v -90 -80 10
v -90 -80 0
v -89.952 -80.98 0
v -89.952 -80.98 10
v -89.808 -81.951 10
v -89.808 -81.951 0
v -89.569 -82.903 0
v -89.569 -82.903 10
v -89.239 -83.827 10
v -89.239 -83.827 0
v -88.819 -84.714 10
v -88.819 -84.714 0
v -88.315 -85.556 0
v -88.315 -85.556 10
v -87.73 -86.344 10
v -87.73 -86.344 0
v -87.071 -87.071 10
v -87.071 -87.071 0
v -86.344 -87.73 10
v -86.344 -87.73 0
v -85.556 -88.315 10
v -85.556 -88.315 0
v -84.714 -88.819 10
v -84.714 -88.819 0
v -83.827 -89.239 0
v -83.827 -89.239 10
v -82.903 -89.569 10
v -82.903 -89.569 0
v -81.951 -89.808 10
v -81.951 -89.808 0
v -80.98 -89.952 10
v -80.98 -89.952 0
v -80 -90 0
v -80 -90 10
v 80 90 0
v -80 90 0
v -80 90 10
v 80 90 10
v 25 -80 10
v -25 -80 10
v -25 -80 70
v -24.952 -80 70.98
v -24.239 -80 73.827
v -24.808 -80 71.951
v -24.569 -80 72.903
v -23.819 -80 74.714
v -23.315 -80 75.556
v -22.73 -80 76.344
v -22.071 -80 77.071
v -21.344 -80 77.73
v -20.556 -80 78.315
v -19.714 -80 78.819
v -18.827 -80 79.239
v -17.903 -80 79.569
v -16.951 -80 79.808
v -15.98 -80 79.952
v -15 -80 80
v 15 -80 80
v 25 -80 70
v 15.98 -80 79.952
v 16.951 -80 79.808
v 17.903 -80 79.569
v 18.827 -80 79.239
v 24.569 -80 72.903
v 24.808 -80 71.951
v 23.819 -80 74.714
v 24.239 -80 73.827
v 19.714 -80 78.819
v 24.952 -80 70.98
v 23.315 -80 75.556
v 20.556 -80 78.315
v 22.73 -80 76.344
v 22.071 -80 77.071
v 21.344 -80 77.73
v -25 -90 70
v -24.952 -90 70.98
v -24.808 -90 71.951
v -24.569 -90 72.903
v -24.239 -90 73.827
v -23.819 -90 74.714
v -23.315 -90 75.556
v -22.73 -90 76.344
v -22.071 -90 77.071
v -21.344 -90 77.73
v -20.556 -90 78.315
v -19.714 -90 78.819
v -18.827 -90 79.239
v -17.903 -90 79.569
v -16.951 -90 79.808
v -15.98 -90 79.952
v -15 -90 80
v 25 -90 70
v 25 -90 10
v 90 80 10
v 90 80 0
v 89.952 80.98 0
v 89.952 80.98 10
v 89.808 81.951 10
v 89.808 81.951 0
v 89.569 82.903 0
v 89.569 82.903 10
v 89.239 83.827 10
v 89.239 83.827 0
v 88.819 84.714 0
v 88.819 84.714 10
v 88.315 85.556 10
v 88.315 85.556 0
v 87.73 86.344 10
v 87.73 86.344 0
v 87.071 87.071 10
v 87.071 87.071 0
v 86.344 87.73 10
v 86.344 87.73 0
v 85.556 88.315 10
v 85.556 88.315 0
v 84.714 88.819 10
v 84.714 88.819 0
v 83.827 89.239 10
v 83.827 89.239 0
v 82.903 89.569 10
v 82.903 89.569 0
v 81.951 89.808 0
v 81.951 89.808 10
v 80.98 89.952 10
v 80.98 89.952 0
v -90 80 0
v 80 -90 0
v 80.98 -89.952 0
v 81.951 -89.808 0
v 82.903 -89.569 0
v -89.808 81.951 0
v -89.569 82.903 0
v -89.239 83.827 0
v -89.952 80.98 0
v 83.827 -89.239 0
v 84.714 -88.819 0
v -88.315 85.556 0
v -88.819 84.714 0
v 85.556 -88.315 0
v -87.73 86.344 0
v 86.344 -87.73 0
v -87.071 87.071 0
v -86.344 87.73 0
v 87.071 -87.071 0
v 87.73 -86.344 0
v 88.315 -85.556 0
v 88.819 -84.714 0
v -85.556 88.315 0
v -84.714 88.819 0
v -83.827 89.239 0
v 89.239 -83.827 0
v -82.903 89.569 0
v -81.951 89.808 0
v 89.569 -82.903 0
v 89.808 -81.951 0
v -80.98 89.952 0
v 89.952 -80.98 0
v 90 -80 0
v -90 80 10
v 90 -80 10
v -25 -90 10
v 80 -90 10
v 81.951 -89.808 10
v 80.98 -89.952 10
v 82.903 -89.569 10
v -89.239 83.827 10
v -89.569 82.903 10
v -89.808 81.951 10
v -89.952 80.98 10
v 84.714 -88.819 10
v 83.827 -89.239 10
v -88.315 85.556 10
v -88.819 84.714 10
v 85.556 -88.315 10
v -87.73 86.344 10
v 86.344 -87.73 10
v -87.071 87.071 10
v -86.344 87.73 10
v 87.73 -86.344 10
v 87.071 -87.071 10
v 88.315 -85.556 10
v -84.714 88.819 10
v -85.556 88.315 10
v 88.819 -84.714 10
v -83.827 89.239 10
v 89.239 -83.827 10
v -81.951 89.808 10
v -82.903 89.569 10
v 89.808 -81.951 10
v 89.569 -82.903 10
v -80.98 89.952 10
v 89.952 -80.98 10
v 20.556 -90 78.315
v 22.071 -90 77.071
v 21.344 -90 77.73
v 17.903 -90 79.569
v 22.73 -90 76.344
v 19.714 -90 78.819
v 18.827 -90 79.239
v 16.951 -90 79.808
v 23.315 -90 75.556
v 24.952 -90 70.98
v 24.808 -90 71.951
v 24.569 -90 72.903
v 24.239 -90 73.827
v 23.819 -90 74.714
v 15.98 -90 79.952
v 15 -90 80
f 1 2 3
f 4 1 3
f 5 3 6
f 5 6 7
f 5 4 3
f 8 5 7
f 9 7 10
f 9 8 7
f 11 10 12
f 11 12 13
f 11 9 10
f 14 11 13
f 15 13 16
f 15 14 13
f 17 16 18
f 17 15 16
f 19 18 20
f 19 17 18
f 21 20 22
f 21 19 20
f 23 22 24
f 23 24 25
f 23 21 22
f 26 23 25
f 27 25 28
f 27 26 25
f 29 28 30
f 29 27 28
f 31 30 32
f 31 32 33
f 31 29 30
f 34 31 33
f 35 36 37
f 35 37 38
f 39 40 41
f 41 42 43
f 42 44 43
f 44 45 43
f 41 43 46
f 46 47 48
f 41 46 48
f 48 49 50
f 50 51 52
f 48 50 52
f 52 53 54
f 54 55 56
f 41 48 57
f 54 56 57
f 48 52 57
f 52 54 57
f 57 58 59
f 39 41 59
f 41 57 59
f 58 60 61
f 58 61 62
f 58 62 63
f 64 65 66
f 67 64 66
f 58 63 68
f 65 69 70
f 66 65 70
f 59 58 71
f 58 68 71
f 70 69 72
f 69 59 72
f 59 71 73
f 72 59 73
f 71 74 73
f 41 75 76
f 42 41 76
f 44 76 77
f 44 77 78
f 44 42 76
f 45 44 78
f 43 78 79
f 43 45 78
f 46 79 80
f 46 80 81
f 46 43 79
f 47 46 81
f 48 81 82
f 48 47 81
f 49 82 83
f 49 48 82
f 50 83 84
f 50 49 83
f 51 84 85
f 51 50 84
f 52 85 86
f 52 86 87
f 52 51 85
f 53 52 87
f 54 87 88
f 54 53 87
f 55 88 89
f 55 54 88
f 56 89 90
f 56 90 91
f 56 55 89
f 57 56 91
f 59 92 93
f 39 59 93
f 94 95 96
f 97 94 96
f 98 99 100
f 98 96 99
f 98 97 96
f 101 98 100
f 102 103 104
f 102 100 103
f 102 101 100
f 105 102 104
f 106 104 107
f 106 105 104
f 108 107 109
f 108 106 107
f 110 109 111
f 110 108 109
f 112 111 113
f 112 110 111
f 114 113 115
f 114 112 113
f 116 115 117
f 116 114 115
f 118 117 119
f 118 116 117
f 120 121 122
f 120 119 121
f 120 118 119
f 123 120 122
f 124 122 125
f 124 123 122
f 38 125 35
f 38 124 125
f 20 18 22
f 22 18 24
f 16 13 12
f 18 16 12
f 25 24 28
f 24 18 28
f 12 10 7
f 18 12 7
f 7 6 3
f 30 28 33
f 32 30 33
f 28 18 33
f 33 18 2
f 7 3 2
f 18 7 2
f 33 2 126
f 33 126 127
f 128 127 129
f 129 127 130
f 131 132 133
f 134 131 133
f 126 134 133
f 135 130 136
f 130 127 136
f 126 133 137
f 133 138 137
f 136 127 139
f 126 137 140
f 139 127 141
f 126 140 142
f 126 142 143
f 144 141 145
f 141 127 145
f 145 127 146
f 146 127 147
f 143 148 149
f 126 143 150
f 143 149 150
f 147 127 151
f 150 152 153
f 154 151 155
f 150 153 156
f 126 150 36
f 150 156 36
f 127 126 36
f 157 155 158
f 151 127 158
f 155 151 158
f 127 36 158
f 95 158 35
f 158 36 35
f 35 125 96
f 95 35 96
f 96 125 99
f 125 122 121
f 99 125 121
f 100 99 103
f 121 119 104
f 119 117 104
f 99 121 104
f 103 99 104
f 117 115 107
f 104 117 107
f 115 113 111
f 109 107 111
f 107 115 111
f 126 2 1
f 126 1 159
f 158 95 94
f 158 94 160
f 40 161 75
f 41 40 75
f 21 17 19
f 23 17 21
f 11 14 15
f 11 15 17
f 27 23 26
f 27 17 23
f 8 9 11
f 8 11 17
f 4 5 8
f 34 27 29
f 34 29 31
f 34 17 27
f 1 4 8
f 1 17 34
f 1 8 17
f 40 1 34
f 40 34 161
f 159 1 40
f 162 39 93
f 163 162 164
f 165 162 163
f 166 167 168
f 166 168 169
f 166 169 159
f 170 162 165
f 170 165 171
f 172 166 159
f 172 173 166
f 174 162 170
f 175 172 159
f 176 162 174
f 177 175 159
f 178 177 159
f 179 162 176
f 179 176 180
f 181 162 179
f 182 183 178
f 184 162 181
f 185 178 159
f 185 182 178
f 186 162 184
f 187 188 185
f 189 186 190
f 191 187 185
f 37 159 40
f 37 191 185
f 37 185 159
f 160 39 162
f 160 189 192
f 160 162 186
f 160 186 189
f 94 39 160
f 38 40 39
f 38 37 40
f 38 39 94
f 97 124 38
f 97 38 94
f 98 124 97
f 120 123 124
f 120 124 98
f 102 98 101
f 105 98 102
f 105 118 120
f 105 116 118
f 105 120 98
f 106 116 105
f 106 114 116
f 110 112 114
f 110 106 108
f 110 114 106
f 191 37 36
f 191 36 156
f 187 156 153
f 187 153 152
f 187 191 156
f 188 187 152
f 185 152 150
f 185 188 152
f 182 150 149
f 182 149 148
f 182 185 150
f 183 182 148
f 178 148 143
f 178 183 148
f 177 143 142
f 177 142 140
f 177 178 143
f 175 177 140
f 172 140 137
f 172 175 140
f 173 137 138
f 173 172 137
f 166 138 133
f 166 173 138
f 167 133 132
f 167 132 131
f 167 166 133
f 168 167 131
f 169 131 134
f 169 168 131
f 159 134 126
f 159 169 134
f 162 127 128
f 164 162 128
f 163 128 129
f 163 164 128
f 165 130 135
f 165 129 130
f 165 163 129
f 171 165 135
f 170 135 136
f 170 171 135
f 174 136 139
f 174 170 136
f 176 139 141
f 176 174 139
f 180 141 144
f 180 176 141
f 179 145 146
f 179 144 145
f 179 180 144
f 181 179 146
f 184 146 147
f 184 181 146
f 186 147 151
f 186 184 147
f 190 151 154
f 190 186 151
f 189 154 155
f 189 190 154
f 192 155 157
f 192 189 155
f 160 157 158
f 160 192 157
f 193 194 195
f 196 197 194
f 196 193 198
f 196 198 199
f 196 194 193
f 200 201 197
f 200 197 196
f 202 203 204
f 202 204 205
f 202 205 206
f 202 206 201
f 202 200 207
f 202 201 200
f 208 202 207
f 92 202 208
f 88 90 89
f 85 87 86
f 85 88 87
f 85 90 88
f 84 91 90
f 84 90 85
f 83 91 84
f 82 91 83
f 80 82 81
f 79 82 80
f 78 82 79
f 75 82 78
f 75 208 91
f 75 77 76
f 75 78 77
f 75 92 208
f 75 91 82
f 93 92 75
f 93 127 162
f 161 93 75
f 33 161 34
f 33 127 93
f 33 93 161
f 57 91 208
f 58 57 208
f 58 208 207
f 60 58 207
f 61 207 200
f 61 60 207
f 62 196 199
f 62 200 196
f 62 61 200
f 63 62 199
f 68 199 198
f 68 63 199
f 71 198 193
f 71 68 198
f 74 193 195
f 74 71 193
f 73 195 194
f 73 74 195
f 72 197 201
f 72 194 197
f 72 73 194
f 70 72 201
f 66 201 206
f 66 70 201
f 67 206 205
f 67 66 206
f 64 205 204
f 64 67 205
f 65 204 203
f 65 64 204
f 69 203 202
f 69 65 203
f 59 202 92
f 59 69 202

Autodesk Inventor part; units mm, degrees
ref_plane "YZ Plane" through (0, 0, 0) normal (1, 0, 0) x (0, 1, 0)
ref_plane "XZ Plane" through (0, 0, 0) normal (0, 1, 0) x (-1, 0, 0)
ref_plane "XY Plane" through (0, 0, 0) normal (0, 0, 1) x (1, 0, 0)
sketch "Sketch1" plane through (0, 0, 0) normal (0, 0, 1) x (1, 0, 0)
  line L0 (-90, 90) -> (90, 90)
  line L1 (90, 90) -> (90, -90)
  line L2 (90, -90) -> (-90, -90)
  line L3 (-90, -90) -> (-90, 90)
  line L4 (90, 40) -> (165, 40)
  line L5 (165, 40) -> (165, -40)
  line L6 (165, -40) -> (90, -40)
  line L7 (90, -40) -> (90, 40)
  point P0 (0, 0)
  point P1 (-90, 0)
  point P2 (165, 0)
  point P3 (90, 0)
  point P4 (90, -40)
  dimension "d0" = 90
  dimension "d1" = 180
  dimension "d2" = 180
  dimension "d29" = 75
  dimension "d30" = 80
extrude "Extrusion1" add sketch "Sketch1" along normal blind 10 contours L0 L1 L2 L3
sketch "Sketch3" plane through (-90, -90, 0) normal (0, -1, 0) x (1, 0, 0)
  line L0 (0, 0) -> (180, 0) projected
  line L1 (180, 0) -> (180, 10) projected
  line L2 (0, 10) -> (180, 10) projected
  line L3 (0, 0) -> (0, 10) projected
  line L4 (65, 10) -> (65, 80)
  line L5 (65, 80) -> (115, 80)
  line L6 (115, 80) -> (115, 10)
  line L7 (0, 10) -> (180, 10) projected
  point P0 (90, 0)
  point P1 (90, 80)
  point P2 (90, 10)
  dimension "d22" = 70
  dimension "d23" = 50
extrude "Extrusion4" add sketch "Sketch3" against normal blind 10 contours L4 L5 L6 L2
fillet "Fillet4" radius 10 6 edges at (-90, 90, 5) (90, 90, 5) (-90, -90, 5) (90, -90, 5) (-25, -85, 80) (25, -85, 80)
sketch "Sketch4" plane through (90, -40, 0) normal (0, -1, 0) x (1, 0, 0)
  line L0 (0, 0) -> (75, 0) projected
  line L1 (75, 0) -> (75, 10) projected
  line L2 (0, 10) -> (75, 10) projected
  line L3 (0, 0) -> (0, 10) projected
  line L4 (75, 10) -> (62.895, 55.1764)
  arc A0 (62.895, 55.1764) -> (27.3654, 61.7133) centre (43.5765, 50) ccw
  line L5 (0, 10) -> (-10, 10)
  line L6 (-10, 10) -> (27.3654, 61.7133)
  point P0 (-90, 0)
  dimension "d31" = 75
  dimension "d32" = 20
  dimension "d33" = 40
  dimension "d36" = 10
equation "\"d0\" = 0.5 * d1"
equation "\"d24\" = d3"
equation "\"d3\" = 10"
properties part number "PWTR-0082" material "Aluminum 6061"
